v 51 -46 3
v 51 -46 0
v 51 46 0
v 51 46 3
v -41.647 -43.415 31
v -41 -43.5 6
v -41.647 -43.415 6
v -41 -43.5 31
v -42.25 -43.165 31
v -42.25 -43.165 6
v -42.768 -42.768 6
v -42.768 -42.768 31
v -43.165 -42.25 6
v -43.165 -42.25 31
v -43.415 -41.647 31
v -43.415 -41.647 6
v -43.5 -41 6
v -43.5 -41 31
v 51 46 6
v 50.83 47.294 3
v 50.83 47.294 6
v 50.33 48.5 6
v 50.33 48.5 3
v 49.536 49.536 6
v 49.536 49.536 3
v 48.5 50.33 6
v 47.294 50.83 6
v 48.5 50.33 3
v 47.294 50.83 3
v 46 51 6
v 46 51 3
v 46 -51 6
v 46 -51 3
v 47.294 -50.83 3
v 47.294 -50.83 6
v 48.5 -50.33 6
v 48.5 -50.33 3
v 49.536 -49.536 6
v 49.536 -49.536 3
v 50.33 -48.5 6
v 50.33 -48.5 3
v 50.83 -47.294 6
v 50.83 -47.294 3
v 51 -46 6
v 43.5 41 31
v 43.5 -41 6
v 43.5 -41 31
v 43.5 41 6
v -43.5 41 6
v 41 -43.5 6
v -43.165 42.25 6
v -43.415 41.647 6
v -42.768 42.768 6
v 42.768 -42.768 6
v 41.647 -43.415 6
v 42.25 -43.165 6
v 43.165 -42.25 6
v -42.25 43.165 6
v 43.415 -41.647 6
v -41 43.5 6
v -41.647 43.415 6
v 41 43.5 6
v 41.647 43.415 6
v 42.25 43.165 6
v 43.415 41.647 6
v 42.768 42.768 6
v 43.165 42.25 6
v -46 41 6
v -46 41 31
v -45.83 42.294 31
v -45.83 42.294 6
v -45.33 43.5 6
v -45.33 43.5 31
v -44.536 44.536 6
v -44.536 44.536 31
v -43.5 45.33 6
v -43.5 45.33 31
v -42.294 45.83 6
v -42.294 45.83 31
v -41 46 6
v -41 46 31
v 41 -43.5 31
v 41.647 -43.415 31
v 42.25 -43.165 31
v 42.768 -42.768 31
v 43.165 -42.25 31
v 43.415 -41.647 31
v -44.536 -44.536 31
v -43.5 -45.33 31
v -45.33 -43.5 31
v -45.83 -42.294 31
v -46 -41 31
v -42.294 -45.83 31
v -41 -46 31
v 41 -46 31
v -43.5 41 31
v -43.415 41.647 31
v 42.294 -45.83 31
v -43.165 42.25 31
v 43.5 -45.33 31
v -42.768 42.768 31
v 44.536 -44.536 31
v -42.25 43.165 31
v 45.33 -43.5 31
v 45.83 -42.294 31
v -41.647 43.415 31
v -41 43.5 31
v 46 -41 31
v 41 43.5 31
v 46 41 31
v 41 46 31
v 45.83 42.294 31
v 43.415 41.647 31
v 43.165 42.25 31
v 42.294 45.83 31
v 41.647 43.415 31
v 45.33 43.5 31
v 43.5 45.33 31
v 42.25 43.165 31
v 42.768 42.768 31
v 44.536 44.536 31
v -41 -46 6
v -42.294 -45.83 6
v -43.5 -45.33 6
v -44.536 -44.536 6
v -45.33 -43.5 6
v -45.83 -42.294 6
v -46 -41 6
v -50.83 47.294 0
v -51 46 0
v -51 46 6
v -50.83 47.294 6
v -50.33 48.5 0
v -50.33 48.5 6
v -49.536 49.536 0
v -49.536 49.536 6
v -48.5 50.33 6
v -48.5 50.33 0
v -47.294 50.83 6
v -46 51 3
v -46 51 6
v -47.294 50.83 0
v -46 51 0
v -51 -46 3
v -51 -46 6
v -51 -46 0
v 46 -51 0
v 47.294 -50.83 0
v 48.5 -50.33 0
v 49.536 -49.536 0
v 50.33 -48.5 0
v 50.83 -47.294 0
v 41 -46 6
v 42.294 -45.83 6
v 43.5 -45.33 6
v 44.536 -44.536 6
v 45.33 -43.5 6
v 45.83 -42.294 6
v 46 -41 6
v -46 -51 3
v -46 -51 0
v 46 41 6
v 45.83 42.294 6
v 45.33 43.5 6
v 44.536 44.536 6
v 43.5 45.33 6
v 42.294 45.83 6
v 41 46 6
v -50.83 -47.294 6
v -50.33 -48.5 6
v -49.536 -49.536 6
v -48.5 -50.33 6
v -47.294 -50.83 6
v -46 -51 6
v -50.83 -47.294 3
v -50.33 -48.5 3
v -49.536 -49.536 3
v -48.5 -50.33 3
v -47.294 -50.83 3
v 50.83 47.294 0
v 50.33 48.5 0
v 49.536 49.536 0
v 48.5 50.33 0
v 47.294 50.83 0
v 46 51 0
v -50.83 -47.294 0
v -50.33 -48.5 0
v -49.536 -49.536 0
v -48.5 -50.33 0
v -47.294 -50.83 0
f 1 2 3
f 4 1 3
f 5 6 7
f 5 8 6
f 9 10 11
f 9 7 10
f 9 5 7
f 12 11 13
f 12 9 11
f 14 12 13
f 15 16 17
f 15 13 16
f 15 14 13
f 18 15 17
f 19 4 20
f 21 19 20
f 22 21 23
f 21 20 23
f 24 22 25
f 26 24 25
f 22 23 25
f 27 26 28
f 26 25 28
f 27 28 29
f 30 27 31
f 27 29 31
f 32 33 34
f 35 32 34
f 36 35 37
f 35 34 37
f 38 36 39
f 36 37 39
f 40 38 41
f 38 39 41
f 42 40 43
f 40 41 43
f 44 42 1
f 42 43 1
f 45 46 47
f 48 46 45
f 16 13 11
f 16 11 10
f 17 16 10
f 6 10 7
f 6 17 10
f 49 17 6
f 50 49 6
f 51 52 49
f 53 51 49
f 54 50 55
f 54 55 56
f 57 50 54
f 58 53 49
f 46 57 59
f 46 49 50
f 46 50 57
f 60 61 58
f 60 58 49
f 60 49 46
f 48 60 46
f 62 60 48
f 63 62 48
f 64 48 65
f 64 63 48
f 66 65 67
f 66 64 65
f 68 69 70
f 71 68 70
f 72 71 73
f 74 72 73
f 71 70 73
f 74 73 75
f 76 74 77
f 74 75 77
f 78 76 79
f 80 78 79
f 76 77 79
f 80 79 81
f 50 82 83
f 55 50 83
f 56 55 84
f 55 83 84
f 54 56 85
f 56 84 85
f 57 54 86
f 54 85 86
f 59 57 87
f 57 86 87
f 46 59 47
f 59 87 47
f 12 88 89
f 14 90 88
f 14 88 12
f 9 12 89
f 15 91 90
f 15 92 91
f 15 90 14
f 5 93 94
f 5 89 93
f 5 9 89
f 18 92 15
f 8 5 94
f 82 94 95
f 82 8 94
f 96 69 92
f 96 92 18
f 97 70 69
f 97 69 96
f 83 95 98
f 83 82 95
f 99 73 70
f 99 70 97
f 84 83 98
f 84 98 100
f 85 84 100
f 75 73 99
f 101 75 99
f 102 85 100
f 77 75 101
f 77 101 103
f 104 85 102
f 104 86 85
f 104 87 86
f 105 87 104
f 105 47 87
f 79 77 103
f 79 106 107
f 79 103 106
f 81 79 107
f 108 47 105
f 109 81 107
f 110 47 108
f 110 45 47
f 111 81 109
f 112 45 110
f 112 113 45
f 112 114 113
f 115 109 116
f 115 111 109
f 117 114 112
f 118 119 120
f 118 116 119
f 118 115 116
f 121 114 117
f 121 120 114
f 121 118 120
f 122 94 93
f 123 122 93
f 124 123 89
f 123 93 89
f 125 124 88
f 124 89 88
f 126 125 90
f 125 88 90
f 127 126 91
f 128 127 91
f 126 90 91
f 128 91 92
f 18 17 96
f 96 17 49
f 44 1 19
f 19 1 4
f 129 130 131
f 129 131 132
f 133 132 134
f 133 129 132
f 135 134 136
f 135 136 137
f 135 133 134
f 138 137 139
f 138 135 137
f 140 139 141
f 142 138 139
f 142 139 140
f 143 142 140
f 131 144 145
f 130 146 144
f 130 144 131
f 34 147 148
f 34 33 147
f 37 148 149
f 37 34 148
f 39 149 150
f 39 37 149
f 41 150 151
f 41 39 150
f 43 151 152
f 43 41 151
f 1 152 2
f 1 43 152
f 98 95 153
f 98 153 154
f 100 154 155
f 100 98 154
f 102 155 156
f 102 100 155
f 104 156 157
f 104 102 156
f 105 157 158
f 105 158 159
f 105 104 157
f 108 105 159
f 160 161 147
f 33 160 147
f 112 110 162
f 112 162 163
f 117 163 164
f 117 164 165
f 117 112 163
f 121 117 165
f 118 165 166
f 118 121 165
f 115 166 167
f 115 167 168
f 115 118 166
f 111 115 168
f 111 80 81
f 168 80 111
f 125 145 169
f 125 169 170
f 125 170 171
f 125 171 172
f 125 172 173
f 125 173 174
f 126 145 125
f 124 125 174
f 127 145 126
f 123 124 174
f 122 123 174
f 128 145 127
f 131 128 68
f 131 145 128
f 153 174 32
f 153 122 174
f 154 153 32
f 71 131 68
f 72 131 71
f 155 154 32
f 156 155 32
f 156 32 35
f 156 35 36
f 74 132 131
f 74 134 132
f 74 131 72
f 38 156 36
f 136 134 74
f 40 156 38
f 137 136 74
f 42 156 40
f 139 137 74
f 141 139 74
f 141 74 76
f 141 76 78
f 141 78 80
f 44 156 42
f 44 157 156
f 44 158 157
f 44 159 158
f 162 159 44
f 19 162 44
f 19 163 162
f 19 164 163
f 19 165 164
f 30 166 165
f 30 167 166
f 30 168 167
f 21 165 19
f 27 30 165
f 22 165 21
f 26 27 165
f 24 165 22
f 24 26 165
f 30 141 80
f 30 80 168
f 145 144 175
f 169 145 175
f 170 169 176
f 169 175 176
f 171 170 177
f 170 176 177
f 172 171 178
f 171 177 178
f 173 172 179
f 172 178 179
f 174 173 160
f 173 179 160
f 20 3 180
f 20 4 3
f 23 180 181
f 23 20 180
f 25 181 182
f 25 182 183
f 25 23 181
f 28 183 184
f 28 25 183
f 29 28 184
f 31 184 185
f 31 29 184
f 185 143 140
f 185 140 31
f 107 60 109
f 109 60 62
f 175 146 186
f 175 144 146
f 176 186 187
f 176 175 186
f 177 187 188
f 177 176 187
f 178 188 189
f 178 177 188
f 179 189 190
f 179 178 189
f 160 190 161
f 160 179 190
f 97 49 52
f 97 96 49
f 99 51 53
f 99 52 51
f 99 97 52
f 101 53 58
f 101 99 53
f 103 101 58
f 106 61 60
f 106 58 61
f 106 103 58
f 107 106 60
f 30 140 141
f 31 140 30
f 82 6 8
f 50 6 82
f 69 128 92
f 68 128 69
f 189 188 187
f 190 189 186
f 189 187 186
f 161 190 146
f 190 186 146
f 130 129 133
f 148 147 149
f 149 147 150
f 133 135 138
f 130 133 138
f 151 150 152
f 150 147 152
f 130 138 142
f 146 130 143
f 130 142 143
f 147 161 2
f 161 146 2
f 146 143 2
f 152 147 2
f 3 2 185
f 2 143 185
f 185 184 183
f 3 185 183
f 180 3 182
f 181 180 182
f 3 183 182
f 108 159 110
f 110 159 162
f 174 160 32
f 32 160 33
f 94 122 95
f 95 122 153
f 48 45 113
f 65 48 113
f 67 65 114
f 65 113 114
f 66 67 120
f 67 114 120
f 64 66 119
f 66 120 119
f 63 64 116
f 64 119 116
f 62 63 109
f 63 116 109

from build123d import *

# Parameters (mm, degrees)
F0_W      = 102
F0_H      = 102
F1_DEPTH  = 3
F2_R      = 5
F3_R      = 5
F4_W      = 92
F4_H      = 92
F5_DEPTH  = 28
F6_R      = 5
F7_R      = 5
F8_T      = -2.5
F9_DEPTH  = 3
F10_DEPTH = 0.5


# Not quite as in the source:
# - an extrude ends at something that could not be found from the text; its depth is read off the source's solid


with BuildPart() as f1:
    # F0 (on Top) → F1 (new body)
    with BuildSketch(Plane.XY):
        Rectangle(F0_W, F0_H)
    extrude(amount=F1_DEPTH)

    # F2
    f2_edges = [f1.edges().sort_by_distance(p)[0] for p in [
        (-51, -51, 1.5),
        (51, -51, 1.5),
        (51, 51, 1.5),
    ]]
    fillet(f2_edges, radius=F2_R)

    # F3
    f3_edges = [f1.edges().sort_by_distance(p)[0] for p in [
        (-51, 51, 1.5),
    ]]
    fillet(f3_edges, radius=F3_R)

    # F4 (on face) → F5 (join)
    with BuildSketch(Plane.XY.offset(3)):
        Rectangle(F4_W, F4_H)
    extrude(amount=F5_DEPTH)

    # F6
    f6_edges = [f1.edges().sort_by_distance(p)[0] for p in [
        (-46, -46, 17),
    ]]
    fillet(f6_edges, radius=F6_R)

    # F7
    f7_edges = [f1.edges().sort_by_distance(p)[0] for p in [
        (46, -46, 17),
        (46, 46, 17),
        (-46, 46, 17),
    ]]
    fillet(f7_edges, radius=F7_R)

    # F8
    f8_openings = [f1.faces().sort_by_distance(p)[0] for p in [
        (0, 0, 31),
    ]]
    offset(amount=F8_T, openings=f8_openings, kind=Kind.INTERSECTION)

    # F9 (add): faces of the model
    f9_faces = [f1.faces().sort_by_distance(p)[0] for p in [
        (-47.4424978336, 0, 3),
        (0, 0, 2.5),
    ]]
    extrude(f9_faces, amount=F9_DEPTH)

    # F10 (add, through all): a face of the model
    f10_faces = [f1.faces().sort_by_distance(p)[0] for p in [
        (0, 0, 5.5),
    ]]
    extrude(f10_faces, amount=F10_DEPTH)


solid = f1.part
